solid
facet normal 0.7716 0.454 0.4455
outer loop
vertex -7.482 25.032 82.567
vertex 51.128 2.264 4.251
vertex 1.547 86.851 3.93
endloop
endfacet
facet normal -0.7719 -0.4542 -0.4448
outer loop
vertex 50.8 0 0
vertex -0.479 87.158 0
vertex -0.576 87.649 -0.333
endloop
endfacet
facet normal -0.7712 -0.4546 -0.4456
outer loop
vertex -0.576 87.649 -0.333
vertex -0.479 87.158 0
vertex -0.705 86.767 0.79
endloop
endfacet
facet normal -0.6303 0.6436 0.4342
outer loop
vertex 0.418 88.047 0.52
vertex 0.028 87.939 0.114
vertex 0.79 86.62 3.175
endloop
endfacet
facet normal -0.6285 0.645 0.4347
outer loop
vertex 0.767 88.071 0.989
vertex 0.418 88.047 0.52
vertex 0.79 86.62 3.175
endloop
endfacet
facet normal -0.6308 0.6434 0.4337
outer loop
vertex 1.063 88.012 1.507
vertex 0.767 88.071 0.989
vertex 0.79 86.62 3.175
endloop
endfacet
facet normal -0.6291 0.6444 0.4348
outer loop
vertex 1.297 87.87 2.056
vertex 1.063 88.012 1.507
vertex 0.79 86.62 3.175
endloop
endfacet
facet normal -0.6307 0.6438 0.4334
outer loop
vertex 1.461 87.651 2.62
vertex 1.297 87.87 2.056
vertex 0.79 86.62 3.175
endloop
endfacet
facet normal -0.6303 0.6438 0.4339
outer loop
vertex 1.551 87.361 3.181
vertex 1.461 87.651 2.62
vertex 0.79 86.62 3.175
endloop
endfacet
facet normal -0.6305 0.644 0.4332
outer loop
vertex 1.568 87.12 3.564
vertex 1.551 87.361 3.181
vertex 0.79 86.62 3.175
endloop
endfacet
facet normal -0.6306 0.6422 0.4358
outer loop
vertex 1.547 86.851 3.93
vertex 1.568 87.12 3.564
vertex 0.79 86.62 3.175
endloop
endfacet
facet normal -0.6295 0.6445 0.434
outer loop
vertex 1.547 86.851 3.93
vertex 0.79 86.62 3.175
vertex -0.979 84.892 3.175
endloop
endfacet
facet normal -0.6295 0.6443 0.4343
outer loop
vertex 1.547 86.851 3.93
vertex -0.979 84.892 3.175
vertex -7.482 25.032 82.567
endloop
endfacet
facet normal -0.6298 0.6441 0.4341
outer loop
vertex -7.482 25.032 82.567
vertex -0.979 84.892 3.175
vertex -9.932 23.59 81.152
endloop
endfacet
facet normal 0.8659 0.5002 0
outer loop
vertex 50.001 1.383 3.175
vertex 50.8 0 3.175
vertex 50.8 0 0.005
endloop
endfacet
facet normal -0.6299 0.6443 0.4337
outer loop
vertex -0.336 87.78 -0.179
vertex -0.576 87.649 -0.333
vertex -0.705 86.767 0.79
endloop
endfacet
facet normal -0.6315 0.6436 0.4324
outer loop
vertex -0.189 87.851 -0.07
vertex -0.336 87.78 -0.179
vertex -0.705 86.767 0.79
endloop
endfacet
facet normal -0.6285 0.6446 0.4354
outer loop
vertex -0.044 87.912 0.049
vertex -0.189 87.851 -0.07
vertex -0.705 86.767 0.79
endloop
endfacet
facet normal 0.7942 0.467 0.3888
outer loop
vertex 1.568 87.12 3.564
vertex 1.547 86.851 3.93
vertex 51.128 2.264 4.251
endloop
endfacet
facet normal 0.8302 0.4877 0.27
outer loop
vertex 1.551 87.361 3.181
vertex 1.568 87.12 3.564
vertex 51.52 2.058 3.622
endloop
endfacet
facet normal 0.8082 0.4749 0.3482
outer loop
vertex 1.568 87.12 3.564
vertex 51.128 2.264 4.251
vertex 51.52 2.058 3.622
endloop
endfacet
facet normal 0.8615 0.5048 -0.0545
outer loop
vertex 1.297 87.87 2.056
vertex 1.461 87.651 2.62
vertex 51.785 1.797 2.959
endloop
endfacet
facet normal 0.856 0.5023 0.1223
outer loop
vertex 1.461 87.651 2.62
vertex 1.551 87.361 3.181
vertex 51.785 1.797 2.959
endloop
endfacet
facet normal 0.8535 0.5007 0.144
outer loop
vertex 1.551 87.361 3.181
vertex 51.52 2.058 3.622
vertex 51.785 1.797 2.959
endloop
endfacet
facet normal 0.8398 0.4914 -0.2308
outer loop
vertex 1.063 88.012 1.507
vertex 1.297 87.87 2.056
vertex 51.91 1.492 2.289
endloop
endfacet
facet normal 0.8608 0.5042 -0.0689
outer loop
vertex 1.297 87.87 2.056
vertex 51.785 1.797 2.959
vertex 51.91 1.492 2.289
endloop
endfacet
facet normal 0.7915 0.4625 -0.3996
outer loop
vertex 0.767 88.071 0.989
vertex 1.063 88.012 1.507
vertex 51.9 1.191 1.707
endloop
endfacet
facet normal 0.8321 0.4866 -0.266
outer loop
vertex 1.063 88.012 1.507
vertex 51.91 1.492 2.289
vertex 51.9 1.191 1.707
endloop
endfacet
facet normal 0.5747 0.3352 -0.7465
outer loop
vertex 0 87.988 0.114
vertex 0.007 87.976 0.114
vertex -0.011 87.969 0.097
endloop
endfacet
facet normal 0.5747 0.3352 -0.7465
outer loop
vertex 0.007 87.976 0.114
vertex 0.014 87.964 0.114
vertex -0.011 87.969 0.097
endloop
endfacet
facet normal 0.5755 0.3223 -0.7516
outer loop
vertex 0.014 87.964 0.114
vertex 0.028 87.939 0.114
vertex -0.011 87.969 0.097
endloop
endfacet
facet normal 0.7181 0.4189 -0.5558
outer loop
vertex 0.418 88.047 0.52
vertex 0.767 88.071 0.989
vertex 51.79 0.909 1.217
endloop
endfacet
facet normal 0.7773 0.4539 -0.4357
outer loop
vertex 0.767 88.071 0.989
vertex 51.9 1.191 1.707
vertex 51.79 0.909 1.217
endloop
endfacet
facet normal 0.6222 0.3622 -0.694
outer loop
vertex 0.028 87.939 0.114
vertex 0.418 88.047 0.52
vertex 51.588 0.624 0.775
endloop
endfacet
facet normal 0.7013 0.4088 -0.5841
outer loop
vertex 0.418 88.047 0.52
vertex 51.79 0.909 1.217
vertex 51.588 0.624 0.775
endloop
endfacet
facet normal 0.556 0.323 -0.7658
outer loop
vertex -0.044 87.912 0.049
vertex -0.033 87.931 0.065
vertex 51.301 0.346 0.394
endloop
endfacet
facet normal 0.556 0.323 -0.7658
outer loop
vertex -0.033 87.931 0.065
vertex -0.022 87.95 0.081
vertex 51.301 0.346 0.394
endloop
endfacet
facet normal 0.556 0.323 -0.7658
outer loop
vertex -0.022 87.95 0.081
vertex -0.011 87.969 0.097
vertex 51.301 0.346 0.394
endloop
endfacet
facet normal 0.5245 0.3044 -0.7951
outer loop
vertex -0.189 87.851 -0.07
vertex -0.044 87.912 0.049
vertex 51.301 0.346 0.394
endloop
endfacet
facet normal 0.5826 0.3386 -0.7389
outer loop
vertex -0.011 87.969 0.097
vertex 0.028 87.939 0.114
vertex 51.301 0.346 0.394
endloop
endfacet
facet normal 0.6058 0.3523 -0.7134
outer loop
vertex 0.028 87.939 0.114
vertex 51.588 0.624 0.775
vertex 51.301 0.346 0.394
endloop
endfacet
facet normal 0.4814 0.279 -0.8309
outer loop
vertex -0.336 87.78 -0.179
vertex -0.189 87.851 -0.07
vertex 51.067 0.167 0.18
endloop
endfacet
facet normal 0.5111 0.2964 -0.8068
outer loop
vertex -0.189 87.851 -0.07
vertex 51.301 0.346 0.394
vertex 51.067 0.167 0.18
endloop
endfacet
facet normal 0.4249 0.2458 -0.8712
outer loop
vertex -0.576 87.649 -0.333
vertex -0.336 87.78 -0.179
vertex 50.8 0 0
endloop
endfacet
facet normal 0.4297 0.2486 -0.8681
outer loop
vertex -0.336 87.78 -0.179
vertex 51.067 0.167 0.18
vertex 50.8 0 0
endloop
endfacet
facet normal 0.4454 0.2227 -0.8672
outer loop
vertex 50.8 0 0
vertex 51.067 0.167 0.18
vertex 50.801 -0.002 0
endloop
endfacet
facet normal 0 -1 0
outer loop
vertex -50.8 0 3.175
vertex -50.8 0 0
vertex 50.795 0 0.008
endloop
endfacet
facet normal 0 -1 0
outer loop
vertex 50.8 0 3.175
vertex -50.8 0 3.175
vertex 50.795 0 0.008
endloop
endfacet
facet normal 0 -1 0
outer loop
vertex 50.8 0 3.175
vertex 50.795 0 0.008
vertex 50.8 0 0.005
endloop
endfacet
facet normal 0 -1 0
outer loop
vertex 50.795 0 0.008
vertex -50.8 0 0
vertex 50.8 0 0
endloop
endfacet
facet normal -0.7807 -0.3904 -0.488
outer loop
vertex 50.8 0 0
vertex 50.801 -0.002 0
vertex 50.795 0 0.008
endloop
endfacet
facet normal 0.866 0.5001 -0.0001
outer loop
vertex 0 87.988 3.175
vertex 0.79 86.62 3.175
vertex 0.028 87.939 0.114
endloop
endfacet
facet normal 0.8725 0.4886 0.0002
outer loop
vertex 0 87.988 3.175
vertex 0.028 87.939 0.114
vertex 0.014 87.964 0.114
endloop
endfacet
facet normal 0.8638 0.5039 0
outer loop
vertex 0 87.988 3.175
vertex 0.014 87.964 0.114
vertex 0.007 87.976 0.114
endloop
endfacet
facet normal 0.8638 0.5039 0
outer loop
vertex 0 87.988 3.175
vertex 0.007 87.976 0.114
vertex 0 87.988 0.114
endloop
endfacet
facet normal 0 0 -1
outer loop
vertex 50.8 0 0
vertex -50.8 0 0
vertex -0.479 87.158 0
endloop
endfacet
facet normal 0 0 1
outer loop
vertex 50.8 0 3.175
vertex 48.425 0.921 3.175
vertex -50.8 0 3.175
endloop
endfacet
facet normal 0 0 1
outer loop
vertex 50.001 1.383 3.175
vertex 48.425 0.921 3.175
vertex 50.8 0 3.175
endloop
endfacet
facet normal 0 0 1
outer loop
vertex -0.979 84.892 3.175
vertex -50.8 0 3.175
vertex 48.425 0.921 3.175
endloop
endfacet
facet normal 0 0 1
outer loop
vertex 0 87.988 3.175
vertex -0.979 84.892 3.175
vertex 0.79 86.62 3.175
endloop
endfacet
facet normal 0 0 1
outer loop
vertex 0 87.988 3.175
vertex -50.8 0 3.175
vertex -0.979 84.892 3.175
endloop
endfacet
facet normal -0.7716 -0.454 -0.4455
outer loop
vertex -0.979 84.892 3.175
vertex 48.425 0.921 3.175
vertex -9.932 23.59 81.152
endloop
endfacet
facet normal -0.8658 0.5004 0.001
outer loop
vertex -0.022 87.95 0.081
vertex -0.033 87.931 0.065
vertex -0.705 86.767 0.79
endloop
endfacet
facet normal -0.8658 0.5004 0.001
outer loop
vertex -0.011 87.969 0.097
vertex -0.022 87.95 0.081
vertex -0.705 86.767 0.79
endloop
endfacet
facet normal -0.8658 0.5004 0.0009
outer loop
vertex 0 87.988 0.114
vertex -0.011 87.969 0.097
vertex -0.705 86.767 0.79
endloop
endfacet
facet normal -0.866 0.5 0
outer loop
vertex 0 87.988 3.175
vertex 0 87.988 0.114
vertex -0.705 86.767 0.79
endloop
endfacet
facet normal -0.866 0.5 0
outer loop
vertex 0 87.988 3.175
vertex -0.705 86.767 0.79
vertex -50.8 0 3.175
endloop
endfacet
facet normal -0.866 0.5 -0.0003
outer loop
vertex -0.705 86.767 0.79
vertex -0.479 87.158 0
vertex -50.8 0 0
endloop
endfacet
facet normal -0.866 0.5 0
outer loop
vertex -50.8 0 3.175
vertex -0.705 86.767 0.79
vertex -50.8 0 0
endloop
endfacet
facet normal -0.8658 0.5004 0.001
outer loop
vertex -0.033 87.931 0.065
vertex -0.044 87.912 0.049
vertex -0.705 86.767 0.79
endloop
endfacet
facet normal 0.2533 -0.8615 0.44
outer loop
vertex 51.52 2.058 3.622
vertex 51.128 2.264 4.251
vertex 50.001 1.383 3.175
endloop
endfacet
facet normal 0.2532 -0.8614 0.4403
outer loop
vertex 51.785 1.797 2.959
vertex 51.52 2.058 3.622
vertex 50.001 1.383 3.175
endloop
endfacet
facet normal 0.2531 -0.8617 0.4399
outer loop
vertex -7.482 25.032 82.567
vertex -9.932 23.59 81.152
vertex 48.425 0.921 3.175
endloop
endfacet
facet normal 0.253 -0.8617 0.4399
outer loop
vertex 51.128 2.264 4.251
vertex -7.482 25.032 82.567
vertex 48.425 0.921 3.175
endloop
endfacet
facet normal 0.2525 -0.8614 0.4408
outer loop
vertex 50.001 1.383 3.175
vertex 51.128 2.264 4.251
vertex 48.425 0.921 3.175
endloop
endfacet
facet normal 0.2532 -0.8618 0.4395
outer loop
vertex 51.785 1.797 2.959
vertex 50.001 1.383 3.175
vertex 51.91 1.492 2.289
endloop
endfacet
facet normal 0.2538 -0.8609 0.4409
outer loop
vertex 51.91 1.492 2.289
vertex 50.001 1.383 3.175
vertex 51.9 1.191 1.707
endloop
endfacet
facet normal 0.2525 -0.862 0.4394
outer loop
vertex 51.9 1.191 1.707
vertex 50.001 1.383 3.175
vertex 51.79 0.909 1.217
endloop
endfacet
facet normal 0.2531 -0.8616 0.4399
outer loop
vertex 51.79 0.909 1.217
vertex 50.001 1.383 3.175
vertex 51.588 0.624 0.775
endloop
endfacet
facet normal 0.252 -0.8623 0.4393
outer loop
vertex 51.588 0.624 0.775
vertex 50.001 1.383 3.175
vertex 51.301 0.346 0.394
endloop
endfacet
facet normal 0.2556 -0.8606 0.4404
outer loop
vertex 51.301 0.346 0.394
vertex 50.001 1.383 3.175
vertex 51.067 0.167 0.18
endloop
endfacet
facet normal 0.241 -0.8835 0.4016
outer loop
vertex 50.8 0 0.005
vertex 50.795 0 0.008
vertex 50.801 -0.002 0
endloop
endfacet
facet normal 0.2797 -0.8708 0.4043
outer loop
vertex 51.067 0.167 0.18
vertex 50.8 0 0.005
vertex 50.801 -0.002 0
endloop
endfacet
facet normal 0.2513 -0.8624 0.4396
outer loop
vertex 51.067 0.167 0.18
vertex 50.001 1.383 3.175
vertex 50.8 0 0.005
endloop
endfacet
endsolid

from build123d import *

# Parameters (mm, degrees)
F1_DEPTH    = 3.175
F5_DEPTH    = 3.175
F6_T1_DEPTH = 117.475


# Not quite as in the source:
# - a fillet or chamfer that OpenCascade refuses, or shapes differently, is made with other operations: its cross-section is extruded or revolved along the edge and cut away or added


with BuildPart() as f1:
    # F0 (on Top) → F1 (new body)
    with BuildSketch(Plane.XY):
        Polygon((50.8, 0), (0, 87.9881810245), (-50.8, 0), align=None)
    extrude(amount=F1_DEPTH)

    # F4 (on line) → F5 (join)
    with BuildSketch(Plane(origin=(30.2473107364, 17.7959839325, 17.4632910558), x_dir=(-0.3931673168, 0.8910065242, -0.226995231), z_dir=(0.7716343063, 0.4539904997, 0.445503225))):
        Polygon((6.5029600393, 75.2459340132), (-19.9755570322, -25.4006840255), (78.3980433443, 0), align=None)
    extrude(amount=F5_DEPTH)

    # F6: fillet of radius 3.175 on 1 edges, made by hand

    # F6_s2 → F6_t1 (cut)
    with BuildSketch(Plane(origin=(17.005719551, -29.012184774, 0.1101218851), x_dir=(-0.862716434, -0.5056880012, 0), z_dir=(-0.5056852899, 0.8627118085, -0.0032746052))):
        with BuildLine():
            ThreePointArc((-45.25402581, 4.1728704395), (-45.421662158, 1.7486197382), (-43.8259948462, -0.0841211704))
            Line((-43.8259948462, -0.0841211704), (-46.668506133, 1.3303591527))
            Line((-46.668506133, 1.3303591527), (-45.25402581, 4.1728704395))
        make_face()
    extrude(amount=F6_T1_DEPTH, mode=Mode.SUBTRACT)


solid = f1.part
